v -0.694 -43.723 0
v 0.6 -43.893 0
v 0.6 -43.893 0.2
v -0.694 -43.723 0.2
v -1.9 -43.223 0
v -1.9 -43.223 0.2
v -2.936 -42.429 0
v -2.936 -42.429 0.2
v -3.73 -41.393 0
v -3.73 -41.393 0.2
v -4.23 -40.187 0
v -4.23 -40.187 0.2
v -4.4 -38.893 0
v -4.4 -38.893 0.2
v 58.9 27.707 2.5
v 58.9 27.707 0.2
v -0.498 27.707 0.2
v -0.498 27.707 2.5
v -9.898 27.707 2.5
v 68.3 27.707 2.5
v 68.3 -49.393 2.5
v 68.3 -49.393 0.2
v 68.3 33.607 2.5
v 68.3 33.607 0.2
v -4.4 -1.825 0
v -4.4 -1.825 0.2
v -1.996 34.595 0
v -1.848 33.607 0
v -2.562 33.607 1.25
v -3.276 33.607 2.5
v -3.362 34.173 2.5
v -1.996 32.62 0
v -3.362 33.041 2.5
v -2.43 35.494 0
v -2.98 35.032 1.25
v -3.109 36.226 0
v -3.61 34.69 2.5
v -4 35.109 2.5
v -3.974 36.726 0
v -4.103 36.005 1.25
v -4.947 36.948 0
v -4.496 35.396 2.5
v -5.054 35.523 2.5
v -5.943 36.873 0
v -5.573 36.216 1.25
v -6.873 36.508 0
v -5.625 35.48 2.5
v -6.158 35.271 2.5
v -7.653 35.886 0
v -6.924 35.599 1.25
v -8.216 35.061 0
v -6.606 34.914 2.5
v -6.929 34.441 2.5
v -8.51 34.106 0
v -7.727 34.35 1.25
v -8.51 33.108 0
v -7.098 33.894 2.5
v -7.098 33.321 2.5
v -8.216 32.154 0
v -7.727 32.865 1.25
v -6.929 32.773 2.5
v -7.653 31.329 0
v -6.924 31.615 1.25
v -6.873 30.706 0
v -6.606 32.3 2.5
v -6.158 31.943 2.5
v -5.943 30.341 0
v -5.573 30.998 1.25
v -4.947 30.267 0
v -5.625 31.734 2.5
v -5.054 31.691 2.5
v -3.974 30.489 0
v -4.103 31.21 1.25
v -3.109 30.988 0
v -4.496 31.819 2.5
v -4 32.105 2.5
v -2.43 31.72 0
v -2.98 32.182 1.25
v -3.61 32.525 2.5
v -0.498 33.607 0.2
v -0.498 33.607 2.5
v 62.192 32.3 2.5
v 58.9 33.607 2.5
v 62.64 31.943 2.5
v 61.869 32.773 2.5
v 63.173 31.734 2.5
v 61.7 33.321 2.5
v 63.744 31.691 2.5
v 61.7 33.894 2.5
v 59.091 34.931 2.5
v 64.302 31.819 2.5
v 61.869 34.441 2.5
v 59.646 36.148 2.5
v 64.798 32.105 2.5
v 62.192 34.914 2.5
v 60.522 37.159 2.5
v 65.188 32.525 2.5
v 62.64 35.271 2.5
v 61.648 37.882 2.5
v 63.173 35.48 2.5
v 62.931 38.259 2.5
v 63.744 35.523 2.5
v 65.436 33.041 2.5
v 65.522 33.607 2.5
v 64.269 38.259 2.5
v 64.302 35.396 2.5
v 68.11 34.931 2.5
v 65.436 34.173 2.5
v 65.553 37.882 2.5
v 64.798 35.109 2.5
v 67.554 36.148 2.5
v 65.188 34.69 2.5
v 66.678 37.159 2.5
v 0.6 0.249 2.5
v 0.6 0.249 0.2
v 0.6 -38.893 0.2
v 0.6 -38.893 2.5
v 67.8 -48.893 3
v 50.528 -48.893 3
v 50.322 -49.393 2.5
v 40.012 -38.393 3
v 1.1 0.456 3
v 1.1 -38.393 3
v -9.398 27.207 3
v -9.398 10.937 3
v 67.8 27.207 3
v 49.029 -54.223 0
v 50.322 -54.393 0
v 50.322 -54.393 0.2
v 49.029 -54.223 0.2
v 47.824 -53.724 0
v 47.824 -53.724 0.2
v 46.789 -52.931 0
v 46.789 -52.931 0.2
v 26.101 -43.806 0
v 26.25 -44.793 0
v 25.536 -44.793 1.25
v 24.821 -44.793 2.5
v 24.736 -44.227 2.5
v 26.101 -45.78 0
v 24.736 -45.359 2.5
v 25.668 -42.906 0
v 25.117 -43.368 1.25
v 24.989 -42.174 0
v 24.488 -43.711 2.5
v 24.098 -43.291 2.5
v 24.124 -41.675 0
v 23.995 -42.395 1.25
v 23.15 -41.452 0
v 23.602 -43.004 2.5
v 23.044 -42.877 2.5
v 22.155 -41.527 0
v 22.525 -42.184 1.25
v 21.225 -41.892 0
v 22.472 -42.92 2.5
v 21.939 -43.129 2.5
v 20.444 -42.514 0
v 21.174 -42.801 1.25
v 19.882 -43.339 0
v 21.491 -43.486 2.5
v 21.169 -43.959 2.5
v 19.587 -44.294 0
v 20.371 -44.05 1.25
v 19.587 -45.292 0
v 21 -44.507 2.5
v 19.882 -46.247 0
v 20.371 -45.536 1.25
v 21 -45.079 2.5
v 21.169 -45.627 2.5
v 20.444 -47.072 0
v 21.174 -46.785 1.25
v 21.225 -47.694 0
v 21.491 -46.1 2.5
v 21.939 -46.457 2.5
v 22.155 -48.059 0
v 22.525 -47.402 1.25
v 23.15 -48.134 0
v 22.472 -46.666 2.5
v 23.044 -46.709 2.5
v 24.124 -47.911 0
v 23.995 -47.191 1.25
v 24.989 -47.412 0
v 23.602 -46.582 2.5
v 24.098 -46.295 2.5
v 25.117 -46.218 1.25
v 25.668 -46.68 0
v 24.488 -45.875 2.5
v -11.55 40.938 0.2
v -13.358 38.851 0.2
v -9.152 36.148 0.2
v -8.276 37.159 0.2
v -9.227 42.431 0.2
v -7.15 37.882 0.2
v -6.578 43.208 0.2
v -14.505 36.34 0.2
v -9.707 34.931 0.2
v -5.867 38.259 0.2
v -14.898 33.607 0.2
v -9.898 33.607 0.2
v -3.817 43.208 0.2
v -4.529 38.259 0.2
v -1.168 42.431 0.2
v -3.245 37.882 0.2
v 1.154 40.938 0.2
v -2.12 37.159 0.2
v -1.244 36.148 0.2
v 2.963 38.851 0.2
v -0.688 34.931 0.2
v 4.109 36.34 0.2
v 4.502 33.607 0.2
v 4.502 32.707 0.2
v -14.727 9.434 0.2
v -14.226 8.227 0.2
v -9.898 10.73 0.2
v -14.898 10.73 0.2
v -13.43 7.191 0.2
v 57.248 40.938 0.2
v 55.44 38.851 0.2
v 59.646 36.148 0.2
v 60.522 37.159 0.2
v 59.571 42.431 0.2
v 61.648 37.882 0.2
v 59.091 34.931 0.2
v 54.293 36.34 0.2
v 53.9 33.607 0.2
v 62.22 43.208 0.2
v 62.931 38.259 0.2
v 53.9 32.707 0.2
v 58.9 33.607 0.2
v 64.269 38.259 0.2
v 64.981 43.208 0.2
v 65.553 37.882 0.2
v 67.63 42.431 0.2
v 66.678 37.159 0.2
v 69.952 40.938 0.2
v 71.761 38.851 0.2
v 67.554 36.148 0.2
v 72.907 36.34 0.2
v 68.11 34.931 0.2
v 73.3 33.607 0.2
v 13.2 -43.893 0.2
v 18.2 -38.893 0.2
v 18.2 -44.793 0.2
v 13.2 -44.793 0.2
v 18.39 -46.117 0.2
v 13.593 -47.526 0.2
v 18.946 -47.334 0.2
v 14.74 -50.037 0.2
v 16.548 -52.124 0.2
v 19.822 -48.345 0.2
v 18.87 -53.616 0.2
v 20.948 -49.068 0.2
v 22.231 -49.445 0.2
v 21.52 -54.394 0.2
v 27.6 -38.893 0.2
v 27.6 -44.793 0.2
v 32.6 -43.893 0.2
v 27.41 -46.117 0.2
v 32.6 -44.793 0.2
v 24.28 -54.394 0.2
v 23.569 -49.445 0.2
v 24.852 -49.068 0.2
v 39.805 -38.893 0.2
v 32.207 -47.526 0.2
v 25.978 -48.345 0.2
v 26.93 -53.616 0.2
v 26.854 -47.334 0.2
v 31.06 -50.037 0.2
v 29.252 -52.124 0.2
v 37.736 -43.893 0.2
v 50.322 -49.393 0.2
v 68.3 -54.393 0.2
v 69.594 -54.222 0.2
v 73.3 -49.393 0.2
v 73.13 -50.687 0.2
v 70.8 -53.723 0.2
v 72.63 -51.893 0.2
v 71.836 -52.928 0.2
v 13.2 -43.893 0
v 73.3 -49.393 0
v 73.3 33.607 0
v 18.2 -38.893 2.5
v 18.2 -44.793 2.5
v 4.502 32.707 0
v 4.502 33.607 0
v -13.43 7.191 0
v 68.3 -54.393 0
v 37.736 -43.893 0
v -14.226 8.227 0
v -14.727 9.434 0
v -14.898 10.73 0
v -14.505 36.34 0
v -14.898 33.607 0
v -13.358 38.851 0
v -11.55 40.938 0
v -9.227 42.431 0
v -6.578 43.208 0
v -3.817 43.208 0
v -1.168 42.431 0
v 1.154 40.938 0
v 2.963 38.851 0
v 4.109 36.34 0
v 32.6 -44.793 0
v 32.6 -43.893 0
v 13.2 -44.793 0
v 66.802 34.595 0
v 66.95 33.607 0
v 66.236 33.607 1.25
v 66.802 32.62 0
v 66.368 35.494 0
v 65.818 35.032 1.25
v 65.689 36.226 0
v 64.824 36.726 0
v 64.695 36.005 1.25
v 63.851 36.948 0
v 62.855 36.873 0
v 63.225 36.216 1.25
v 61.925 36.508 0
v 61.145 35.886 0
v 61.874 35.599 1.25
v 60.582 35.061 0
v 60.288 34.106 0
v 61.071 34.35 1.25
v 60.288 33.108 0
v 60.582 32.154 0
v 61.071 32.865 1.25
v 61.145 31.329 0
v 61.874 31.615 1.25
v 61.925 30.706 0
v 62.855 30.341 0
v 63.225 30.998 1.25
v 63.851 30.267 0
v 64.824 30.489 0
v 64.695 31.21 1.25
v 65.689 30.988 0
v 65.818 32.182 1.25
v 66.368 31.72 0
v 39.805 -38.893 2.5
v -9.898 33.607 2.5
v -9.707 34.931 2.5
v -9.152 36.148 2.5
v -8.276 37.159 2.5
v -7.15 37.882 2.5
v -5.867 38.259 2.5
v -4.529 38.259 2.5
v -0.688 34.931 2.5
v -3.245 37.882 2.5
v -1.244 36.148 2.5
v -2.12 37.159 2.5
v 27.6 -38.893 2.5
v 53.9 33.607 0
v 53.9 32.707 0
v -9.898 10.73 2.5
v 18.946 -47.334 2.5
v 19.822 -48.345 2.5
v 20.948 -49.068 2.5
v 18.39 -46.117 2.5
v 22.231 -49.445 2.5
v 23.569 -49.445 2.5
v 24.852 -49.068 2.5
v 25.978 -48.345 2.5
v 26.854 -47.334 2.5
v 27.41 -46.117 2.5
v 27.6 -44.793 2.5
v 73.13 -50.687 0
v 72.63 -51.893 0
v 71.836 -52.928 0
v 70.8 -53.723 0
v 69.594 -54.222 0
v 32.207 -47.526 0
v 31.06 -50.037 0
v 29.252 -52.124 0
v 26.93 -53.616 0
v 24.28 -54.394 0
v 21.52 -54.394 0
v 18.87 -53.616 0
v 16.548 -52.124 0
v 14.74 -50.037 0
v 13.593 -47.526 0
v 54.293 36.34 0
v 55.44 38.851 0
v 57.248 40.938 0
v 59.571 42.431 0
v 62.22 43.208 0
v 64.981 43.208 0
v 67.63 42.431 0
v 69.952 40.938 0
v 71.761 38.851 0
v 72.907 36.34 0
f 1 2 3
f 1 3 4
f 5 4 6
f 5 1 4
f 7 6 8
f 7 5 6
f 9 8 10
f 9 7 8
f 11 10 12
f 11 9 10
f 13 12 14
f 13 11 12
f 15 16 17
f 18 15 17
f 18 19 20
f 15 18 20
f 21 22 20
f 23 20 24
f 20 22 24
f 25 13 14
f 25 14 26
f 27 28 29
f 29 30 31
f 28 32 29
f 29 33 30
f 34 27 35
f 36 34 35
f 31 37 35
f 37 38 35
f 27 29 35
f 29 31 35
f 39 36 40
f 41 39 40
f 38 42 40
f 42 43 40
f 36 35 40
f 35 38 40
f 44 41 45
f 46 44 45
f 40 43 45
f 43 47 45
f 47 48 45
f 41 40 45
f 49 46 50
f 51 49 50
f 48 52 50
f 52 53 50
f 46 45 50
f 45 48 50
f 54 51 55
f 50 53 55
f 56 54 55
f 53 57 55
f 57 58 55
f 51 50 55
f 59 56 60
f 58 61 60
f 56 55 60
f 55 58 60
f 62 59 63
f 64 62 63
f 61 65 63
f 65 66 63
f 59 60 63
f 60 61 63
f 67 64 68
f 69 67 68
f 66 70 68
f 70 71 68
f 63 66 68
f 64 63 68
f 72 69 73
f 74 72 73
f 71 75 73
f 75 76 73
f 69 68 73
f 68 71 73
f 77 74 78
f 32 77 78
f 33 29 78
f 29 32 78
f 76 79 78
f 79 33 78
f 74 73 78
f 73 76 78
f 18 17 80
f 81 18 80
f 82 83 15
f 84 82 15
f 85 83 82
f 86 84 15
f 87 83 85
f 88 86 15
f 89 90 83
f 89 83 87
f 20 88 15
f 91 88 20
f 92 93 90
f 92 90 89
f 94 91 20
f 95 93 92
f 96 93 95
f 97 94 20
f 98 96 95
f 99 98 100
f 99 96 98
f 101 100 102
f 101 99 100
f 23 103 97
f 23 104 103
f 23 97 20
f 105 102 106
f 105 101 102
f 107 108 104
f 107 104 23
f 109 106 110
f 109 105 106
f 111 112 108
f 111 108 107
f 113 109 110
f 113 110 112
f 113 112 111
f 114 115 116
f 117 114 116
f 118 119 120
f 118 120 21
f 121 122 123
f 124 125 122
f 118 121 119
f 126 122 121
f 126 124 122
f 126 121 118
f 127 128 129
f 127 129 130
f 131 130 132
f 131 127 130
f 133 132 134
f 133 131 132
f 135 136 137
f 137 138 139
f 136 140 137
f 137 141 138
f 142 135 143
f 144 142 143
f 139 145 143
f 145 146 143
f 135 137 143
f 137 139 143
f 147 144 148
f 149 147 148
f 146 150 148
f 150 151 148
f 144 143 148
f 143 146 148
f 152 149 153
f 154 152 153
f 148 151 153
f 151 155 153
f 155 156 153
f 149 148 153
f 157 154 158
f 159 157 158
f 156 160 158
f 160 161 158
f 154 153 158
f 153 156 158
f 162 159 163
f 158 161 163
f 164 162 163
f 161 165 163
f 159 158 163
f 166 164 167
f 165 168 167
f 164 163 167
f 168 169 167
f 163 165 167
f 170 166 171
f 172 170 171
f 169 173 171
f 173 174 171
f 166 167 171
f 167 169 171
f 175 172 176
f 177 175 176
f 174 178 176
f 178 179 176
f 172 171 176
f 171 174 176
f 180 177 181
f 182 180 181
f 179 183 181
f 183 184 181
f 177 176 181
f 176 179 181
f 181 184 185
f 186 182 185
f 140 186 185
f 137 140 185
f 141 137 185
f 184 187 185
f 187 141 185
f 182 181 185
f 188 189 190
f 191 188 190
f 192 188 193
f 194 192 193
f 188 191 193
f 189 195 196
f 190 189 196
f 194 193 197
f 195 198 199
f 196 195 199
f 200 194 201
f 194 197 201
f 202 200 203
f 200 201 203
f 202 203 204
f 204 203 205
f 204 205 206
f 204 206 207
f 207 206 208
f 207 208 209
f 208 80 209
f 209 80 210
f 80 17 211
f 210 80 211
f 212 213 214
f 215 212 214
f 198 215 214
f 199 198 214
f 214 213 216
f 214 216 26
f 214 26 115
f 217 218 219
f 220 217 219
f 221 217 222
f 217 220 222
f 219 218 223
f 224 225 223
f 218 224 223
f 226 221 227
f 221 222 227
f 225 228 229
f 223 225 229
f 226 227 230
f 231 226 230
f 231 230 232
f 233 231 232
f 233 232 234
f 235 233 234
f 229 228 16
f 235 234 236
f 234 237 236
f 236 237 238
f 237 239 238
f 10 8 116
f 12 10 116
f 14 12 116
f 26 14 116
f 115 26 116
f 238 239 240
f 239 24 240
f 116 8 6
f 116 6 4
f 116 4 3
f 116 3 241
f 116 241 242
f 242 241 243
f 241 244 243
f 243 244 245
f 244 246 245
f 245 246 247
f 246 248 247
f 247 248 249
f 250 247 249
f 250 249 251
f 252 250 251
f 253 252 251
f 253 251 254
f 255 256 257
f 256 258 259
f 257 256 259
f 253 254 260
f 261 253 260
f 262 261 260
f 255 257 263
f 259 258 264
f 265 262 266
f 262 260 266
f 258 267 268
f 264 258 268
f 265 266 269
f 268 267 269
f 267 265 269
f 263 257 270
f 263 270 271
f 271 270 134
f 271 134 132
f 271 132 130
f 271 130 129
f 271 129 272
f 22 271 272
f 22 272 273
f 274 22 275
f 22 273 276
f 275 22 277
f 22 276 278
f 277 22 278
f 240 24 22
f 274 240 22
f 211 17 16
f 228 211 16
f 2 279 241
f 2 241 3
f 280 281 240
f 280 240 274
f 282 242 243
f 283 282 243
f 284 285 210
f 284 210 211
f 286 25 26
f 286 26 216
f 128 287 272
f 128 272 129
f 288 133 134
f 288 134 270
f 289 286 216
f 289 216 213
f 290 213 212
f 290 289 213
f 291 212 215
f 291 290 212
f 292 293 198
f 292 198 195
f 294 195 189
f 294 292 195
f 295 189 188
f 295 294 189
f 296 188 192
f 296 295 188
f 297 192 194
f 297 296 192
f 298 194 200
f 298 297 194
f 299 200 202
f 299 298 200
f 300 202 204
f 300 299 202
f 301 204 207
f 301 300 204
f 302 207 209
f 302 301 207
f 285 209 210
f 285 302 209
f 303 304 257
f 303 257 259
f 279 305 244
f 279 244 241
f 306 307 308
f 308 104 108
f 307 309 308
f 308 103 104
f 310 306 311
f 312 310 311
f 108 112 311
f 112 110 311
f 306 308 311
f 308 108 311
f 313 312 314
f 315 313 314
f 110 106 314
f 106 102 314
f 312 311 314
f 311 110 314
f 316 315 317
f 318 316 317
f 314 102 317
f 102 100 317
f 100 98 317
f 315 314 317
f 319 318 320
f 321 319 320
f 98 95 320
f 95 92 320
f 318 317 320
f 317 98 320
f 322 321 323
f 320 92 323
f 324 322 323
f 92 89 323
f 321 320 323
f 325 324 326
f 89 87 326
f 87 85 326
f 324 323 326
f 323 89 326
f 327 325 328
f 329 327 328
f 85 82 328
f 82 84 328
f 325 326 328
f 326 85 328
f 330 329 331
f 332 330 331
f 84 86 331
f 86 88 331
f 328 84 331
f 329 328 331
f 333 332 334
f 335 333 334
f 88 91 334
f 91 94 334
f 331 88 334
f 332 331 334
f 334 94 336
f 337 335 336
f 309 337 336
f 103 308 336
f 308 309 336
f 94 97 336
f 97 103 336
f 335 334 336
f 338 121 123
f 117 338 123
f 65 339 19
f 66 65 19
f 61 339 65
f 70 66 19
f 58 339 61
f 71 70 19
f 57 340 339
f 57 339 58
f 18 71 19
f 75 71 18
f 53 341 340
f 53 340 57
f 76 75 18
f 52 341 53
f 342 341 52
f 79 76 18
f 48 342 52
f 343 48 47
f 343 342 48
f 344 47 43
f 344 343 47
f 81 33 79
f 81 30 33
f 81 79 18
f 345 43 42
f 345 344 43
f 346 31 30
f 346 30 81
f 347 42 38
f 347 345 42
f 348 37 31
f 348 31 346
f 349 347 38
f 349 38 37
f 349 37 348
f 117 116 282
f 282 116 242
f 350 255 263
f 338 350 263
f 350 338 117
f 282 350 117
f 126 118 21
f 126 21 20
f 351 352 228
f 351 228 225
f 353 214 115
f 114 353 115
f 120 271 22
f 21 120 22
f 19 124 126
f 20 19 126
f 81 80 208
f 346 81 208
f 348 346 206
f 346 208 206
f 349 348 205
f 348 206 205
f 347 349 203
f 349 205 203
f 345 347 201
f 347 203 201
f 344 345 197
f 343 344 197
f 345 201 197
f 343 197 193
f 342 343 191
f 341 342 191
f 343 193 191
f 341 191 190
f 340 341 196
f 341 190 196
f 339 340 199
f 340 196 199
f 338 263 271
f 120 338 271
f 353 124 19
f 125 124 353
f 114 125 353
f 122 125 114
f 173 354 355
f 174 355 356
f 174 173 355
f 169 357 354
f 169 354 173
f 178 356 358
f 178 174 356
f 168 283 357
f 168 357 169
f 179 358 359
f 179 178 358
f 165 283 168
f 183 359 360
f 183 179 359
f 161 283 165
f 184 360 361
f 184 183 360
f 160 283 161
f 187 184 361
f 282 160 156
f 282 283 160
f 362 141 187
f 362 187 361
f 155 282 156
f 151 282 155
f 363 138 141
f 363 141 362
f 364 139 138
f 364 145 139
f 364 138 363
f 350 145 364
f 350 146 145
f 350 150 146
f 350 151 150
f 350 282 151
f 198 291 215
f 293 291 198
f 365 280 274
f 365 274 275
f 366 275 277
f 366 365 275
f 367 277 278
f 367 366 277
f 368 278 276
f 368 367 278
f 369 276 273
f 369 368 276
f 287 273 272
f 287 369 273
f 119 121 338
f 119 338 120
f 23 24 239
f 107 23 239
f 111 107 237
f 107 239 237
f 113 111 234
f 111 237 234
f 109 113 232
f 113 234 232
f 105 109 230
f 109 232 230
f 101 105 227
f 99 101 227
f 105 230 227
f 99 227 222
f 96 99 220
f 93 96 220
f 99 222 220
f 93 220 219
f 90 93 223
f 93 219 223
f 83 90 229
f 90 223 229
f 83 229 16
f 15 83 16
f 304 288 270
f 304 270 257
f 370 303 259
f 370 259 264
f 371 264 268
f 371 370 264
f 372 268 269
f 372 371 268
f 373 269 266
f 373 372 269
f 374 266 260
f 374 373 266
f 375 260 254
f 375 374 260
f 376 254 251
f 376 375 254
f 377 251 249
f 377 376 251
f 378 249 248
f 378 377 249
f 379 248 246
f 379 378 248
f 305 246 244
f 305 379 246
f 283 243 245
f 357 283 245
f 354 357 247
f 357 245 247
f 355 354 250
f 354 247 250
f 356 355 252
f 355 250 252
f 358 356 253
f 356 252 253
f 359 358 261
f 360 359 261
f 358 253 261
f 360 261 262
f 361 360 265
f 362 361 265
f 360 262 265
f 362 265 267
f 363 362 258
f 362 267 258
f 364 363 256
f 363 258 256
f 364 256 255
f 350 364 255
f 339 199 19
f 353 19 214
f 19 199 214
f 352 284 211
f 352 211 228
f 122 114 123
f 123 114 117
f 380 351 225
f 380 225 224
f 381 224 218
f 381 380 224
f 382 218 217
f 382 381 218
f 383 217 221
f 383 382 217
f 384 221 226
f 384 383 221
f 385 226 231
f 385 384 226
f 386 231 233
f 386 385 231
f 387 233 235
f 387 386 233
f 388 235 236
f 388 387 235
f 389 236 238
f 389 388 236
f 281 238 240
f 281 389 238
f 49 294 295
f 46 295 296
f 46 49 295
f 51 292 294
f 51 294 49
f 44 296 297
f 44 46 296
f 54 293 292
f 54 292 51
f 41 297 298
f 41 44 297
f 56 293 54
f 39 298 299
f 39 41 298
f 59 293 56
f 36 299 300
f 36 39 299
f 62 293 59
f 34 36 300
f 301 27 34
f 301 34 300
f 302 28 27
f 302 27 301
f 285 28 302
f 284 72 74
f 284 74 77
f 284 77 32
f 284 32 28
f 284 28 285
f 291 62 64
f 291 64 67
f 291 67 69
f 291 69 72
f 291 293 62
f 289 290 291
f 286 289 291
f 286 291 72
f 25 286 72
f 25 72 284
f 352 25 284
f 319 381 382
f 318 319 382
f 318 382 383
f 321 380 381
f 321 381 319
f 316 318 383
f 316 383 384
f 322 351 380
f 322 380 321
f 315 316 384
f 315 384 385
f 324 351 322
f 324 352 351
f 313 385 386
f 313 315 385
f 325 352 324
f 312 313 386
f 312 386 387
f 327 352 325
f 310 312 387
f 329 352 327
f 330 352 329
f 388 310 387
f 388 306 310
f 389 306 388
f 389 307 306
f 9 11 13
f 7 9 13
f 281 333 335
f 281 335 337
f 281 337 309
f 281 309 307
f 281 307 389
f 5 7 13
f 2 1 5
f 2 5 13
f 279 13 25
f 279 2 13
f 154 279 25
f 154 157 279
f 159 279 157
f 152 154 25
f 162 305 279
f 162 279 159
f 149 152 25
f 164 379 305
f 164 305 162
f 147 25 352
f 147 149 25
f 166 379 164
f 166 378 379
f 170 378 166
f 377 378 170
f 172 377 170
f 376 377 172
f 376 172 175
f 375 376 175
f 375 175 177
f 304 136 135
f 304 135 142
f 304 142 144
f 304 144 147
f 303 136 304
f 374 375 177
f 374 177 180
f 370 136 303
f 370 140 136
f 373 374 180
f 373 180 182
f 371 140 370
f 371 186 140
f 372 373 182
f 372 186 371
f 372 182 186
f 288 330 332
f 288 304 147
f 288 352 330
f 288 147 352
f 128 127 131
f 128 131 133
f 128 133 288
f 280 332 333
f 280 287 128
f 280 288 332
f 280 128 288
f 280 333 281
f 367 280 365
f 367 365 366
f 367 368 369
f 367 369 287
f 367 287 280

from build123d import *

# Parameters (mm, degrees)
F0_R     = 1.75
F1_DEPTH = 3
F2_SIZE2 = 2.8
F2_SIZE  = 1.6
F4_DEPTH = 0.5
F5_SIZE  = 0.49999
F7_DEPTH = 0.2


# Not quite as in the source:
# - a fillet or chamfer is up to 0.001 mm smaller than in the source, because OpenCascade refuses the exact size


with BuildPart() as f1:
    # F0 (on Top) → F1 (new body)
    with BuildSketch(Plane.XY):
        with BuildLine():
            Line((18.2, -38.893), (18.2, -44.793))
            ThreePointArc((18.2, -44.793), (22.9, -49.493), (27.6, -44.793))
            Line((27.6, -44.793), (27.6, -38.893))
            Line((27.6, -38.893), (39.8048274606, -38.893))
            Line((39.8048274606, -38.893), (50.3215900894, -49.3928583233))
            Line((50.3215900894, -49.3928583233), (68.3003446043, -49.3928583233))
            Line((68.3003446043, -49.3928583233), (68.3003446043, 33.6071416767))
            ThreePointArc((68.3003446043, 33.6071416767), (63.6003446043, 38.3071416767), (58.9003446043, 33.6071416767))
            Line((58.9003446043, 33.6071416767), (58.9003446043, 27.7071416767))
            Line((58.9003446043, 27.7071416767), (-0.4976553957, 27.7071416767))
            Line((-0.4976553957, 27.7071416767), (-0.4976553957, 33.6071416767))
            ThreePointArc((-0.4976553957, 33.6071416767), (-5.1976553957, 38.3071416767), (-9.8976553957, 33.6071416767))
            Line((-9.8976553957, 33.6071416767), (-9.8976553957, 10.7295926865))
            Line((-9.8976553957, 10.7295926865), (0.6, 0.248810884))
            Line((0.6, 0.248810884), (0.6, -38.893))
            Line((0.6, -38.893), (18.2, -38.893))
        make_face()
        with Locations((22.9, -44.793)):
            Circle(F0_R, mode=Mode.SUBTRACT)
        with Locations((-5.1976553957, 33.6071416767)):
            Circle(F0_R, mode=Mode.SUBTRACT)
        with Locations((63.6003446043, 33.6071416767)):
            Circle(F0_R, mode=Mode.SUBTRACT)
    extrude(amount=F1_DEPTH)

    # F2
    f2_edges = [f1.edges().sort_by_distance(p)[0] for p in [
        (21.15, -44.793, 0),
        (-6.947655, 33.607142, 0),
        (61.850345, 33.607142, 0),
    ]]
    f2_side = f1.faces().sort_by_distance((33.412828, -5.806914, 0))[0]
    chamfer(f2_edges, length=F2_SIZE, length2=F2_SIZE2, reference=f2_side)

    # F3 (on face) → F4 (cut)
    with BuildSketch(Plane.XY.offset(3)):
        with BuildLine():
            Line((-9.8976553957, 27.7071416767), (-0.4976553957, 27.7071416767))
            Line((-0.4976553957, 27.7071416767), (-0.4976553957, 33.6071416767))
            ThreePointArc((-0.4976553957, 33.6071416767), (-5.1976553957, 38.3071416767), (-9.8976553957, 33.6071416767))
            Line((-9.8976553957, 33.6071416767), (-9.8976553957, 27.7071416767))
        make_face()
        with BuildLine():
            Line((58.9003446043, 33.6071416767), (58.9003446043, 27.7071416767))
            Line((58.9003446043, 27.7071416767), (68.3003446043, 27.7071416767))
            Line((68.3003446043, 27.7071416767), (68.3003446043, 33.6071416767))
            ThreePointArc((68.3003446043, 33.6071416767), (63.6003446043, 38.3071416767), (58.9003446043, 33.6071416767))
        make_face()
        with BuildLine():
            Line((27.6, -38.893), (18.2, -38.893))
            Line((18.2, -38.893), (18.2, -44.793))
            ThreePointArc((18.2, -44.793), (22.9, -49.493), (27.6, -44.793))
            Line((27.6, -44.793), (27.6, -38.893))
        make_face()
    extrude(amount=-F4_DEPTH, mode=Mode.SUBTRACT)

    # F5 (size 0.5 in the source; OpenCascade refuses exactly that, so slightly less here)
    f5_edges = [f1.edges().sort_by_distance(p)[0] for p in [
        (29.201345, 27.707142, 3),
        (-9.897655, 19.218367, 3),
        (-4.648828, 5.489202, 3),
        (0.6, -19.322095, 3),
        (20.202414, -38.893, 3),
        (45.063209, -44.142929, 3),
        (59.310967, -49.392858, 3),
        (68.300345, -10.842858, 3),
    ]]
    chamfer(f5_edges, length=F5_SIZE)

    # F6 (on face) → F7 (join)
    with BuildSketch(Plane(origin=(0, 0, 0), x_dir=(1, 0, 0), z_dir=(0, 0, -1))):
        with BuildLine():
            ThreePointArc((0.6, 43.893), (-2.9355339059, 42.4285339059), (-4.4, 38.893))
            Line((-4.4, 38.893), (-4.4, 1.824613149))
            Line((-4.4, 1.824613149), (-13.4303444218, -7.1912161881))
            ThreePointArc((-13.4303444218, -7.1912161881), (-14.5162831751, -8.8143179191), (-14.8976553957, -10.7295926865))
            Line((-14.8976553957, -10.7295926865), (-14.8976553957, -33.6071416767))
            ThreePointArc((-14.8976553957, -33.6071416767), (-5.1976553957, -43.3071416767), (4.5023446043, -33.6071416767))
            Line((4.5023446043, -33.6071416767), (4.5023446043, -32.7071416767))
            Line((4.5023446043, -32.7071416767), (53.9003446043, -32.7071416767))
            Line((53.9003446043, -32.7071416767), (53.9003446043, -33.6071416767))
            ThreePointArc((53.9003446043, -33.6071416767), (63.6003446043, -43.3071416767), (73.3003446043, -33.6071416767))
            Line((73.3003446043, -33.6071416767), (73.3003446043, 49.3928583233))
            ThreePointArc((73.3003446043, 49.3928583233), (71.8358785102, 52.9283922293), (68.3003446043, 54.3928583233))
            Line((68.3003446043, 54.3928583233), (50.3215900894, 54.3928583233))
            ThreePointArc((50.3215900894, 54.3928583233), (48.4100308427, 54.0130251219), (46.7889010633, 52.9312348218))
            Line((46.7889010633, 52.9312348218), (37.736115085, 43.893))
            Line((37.736115085, 43.893), (32.6, 43.893))
            Line((32.6, 43.893), (32.6, 44.793))
            ThreePointArc((32.6, 44.793), (22.9, 54.493), (13.2, 44.793))
            Line((13.2, 44.793), (13.2, 43.893))
            Line((13.2, 43.893), (0.6, 43.893))
        make_face()
        with BuildLine():
            Line((-9.8976553957, -33.6071416767), (-9.8976553957, -10.7295926865))
            Line((-9.8976553957, -10.7295926865), (0.6, -0.248810884))
            Line((0.6, -0.248810884), (0.6, 38.893))
            Line((0.6, 38.893), (18.2, 38.893))
            Line((18.2, 38.893), (18.2, 44.793))
            ThreePointArc((18.2, 44.793), (22.9, 49.493), (27.6, 44.793))
            Line((27.6, 44.793), (27.6, 38.893))
            Line((27.6, 38.893), (39.8048274606, 38.893))
            Line((39.8048274606, 38.893), (50.3215900894, 49.3928583233))
            Line((50.3215900894, 49.3928583233), (68.3003446043, 49.3928583233))
            Line((68.3003446043, 49.3928583233), (68.3003446043, -33.6071416767))
            ThreePointArc((68.3003446043, -33.6071416767), (63.6003446043, -38.3071416767), (58.9003446043, -33.6071416767))
            Line((58.9003446043, -33.6071416767), (58.9003446043, -27.7071416767))
            Line((58.9003446043, -27.7071416767), (-0.4976553957, -27.7071416767))
            Line((-0.4976553957, -27.7071416767), (-0.4976553957, -33.6071416767))
            ThreePointArc((-0.4976553957, -33.6071416767), (-5.1976553957, -38.3071416767), (-9.8976553957, -33.6071416767))
        make_face(mode=Mode.SUBTRACT)
    extrude(amount=-F7_DEPTH)


solid = f1.part
